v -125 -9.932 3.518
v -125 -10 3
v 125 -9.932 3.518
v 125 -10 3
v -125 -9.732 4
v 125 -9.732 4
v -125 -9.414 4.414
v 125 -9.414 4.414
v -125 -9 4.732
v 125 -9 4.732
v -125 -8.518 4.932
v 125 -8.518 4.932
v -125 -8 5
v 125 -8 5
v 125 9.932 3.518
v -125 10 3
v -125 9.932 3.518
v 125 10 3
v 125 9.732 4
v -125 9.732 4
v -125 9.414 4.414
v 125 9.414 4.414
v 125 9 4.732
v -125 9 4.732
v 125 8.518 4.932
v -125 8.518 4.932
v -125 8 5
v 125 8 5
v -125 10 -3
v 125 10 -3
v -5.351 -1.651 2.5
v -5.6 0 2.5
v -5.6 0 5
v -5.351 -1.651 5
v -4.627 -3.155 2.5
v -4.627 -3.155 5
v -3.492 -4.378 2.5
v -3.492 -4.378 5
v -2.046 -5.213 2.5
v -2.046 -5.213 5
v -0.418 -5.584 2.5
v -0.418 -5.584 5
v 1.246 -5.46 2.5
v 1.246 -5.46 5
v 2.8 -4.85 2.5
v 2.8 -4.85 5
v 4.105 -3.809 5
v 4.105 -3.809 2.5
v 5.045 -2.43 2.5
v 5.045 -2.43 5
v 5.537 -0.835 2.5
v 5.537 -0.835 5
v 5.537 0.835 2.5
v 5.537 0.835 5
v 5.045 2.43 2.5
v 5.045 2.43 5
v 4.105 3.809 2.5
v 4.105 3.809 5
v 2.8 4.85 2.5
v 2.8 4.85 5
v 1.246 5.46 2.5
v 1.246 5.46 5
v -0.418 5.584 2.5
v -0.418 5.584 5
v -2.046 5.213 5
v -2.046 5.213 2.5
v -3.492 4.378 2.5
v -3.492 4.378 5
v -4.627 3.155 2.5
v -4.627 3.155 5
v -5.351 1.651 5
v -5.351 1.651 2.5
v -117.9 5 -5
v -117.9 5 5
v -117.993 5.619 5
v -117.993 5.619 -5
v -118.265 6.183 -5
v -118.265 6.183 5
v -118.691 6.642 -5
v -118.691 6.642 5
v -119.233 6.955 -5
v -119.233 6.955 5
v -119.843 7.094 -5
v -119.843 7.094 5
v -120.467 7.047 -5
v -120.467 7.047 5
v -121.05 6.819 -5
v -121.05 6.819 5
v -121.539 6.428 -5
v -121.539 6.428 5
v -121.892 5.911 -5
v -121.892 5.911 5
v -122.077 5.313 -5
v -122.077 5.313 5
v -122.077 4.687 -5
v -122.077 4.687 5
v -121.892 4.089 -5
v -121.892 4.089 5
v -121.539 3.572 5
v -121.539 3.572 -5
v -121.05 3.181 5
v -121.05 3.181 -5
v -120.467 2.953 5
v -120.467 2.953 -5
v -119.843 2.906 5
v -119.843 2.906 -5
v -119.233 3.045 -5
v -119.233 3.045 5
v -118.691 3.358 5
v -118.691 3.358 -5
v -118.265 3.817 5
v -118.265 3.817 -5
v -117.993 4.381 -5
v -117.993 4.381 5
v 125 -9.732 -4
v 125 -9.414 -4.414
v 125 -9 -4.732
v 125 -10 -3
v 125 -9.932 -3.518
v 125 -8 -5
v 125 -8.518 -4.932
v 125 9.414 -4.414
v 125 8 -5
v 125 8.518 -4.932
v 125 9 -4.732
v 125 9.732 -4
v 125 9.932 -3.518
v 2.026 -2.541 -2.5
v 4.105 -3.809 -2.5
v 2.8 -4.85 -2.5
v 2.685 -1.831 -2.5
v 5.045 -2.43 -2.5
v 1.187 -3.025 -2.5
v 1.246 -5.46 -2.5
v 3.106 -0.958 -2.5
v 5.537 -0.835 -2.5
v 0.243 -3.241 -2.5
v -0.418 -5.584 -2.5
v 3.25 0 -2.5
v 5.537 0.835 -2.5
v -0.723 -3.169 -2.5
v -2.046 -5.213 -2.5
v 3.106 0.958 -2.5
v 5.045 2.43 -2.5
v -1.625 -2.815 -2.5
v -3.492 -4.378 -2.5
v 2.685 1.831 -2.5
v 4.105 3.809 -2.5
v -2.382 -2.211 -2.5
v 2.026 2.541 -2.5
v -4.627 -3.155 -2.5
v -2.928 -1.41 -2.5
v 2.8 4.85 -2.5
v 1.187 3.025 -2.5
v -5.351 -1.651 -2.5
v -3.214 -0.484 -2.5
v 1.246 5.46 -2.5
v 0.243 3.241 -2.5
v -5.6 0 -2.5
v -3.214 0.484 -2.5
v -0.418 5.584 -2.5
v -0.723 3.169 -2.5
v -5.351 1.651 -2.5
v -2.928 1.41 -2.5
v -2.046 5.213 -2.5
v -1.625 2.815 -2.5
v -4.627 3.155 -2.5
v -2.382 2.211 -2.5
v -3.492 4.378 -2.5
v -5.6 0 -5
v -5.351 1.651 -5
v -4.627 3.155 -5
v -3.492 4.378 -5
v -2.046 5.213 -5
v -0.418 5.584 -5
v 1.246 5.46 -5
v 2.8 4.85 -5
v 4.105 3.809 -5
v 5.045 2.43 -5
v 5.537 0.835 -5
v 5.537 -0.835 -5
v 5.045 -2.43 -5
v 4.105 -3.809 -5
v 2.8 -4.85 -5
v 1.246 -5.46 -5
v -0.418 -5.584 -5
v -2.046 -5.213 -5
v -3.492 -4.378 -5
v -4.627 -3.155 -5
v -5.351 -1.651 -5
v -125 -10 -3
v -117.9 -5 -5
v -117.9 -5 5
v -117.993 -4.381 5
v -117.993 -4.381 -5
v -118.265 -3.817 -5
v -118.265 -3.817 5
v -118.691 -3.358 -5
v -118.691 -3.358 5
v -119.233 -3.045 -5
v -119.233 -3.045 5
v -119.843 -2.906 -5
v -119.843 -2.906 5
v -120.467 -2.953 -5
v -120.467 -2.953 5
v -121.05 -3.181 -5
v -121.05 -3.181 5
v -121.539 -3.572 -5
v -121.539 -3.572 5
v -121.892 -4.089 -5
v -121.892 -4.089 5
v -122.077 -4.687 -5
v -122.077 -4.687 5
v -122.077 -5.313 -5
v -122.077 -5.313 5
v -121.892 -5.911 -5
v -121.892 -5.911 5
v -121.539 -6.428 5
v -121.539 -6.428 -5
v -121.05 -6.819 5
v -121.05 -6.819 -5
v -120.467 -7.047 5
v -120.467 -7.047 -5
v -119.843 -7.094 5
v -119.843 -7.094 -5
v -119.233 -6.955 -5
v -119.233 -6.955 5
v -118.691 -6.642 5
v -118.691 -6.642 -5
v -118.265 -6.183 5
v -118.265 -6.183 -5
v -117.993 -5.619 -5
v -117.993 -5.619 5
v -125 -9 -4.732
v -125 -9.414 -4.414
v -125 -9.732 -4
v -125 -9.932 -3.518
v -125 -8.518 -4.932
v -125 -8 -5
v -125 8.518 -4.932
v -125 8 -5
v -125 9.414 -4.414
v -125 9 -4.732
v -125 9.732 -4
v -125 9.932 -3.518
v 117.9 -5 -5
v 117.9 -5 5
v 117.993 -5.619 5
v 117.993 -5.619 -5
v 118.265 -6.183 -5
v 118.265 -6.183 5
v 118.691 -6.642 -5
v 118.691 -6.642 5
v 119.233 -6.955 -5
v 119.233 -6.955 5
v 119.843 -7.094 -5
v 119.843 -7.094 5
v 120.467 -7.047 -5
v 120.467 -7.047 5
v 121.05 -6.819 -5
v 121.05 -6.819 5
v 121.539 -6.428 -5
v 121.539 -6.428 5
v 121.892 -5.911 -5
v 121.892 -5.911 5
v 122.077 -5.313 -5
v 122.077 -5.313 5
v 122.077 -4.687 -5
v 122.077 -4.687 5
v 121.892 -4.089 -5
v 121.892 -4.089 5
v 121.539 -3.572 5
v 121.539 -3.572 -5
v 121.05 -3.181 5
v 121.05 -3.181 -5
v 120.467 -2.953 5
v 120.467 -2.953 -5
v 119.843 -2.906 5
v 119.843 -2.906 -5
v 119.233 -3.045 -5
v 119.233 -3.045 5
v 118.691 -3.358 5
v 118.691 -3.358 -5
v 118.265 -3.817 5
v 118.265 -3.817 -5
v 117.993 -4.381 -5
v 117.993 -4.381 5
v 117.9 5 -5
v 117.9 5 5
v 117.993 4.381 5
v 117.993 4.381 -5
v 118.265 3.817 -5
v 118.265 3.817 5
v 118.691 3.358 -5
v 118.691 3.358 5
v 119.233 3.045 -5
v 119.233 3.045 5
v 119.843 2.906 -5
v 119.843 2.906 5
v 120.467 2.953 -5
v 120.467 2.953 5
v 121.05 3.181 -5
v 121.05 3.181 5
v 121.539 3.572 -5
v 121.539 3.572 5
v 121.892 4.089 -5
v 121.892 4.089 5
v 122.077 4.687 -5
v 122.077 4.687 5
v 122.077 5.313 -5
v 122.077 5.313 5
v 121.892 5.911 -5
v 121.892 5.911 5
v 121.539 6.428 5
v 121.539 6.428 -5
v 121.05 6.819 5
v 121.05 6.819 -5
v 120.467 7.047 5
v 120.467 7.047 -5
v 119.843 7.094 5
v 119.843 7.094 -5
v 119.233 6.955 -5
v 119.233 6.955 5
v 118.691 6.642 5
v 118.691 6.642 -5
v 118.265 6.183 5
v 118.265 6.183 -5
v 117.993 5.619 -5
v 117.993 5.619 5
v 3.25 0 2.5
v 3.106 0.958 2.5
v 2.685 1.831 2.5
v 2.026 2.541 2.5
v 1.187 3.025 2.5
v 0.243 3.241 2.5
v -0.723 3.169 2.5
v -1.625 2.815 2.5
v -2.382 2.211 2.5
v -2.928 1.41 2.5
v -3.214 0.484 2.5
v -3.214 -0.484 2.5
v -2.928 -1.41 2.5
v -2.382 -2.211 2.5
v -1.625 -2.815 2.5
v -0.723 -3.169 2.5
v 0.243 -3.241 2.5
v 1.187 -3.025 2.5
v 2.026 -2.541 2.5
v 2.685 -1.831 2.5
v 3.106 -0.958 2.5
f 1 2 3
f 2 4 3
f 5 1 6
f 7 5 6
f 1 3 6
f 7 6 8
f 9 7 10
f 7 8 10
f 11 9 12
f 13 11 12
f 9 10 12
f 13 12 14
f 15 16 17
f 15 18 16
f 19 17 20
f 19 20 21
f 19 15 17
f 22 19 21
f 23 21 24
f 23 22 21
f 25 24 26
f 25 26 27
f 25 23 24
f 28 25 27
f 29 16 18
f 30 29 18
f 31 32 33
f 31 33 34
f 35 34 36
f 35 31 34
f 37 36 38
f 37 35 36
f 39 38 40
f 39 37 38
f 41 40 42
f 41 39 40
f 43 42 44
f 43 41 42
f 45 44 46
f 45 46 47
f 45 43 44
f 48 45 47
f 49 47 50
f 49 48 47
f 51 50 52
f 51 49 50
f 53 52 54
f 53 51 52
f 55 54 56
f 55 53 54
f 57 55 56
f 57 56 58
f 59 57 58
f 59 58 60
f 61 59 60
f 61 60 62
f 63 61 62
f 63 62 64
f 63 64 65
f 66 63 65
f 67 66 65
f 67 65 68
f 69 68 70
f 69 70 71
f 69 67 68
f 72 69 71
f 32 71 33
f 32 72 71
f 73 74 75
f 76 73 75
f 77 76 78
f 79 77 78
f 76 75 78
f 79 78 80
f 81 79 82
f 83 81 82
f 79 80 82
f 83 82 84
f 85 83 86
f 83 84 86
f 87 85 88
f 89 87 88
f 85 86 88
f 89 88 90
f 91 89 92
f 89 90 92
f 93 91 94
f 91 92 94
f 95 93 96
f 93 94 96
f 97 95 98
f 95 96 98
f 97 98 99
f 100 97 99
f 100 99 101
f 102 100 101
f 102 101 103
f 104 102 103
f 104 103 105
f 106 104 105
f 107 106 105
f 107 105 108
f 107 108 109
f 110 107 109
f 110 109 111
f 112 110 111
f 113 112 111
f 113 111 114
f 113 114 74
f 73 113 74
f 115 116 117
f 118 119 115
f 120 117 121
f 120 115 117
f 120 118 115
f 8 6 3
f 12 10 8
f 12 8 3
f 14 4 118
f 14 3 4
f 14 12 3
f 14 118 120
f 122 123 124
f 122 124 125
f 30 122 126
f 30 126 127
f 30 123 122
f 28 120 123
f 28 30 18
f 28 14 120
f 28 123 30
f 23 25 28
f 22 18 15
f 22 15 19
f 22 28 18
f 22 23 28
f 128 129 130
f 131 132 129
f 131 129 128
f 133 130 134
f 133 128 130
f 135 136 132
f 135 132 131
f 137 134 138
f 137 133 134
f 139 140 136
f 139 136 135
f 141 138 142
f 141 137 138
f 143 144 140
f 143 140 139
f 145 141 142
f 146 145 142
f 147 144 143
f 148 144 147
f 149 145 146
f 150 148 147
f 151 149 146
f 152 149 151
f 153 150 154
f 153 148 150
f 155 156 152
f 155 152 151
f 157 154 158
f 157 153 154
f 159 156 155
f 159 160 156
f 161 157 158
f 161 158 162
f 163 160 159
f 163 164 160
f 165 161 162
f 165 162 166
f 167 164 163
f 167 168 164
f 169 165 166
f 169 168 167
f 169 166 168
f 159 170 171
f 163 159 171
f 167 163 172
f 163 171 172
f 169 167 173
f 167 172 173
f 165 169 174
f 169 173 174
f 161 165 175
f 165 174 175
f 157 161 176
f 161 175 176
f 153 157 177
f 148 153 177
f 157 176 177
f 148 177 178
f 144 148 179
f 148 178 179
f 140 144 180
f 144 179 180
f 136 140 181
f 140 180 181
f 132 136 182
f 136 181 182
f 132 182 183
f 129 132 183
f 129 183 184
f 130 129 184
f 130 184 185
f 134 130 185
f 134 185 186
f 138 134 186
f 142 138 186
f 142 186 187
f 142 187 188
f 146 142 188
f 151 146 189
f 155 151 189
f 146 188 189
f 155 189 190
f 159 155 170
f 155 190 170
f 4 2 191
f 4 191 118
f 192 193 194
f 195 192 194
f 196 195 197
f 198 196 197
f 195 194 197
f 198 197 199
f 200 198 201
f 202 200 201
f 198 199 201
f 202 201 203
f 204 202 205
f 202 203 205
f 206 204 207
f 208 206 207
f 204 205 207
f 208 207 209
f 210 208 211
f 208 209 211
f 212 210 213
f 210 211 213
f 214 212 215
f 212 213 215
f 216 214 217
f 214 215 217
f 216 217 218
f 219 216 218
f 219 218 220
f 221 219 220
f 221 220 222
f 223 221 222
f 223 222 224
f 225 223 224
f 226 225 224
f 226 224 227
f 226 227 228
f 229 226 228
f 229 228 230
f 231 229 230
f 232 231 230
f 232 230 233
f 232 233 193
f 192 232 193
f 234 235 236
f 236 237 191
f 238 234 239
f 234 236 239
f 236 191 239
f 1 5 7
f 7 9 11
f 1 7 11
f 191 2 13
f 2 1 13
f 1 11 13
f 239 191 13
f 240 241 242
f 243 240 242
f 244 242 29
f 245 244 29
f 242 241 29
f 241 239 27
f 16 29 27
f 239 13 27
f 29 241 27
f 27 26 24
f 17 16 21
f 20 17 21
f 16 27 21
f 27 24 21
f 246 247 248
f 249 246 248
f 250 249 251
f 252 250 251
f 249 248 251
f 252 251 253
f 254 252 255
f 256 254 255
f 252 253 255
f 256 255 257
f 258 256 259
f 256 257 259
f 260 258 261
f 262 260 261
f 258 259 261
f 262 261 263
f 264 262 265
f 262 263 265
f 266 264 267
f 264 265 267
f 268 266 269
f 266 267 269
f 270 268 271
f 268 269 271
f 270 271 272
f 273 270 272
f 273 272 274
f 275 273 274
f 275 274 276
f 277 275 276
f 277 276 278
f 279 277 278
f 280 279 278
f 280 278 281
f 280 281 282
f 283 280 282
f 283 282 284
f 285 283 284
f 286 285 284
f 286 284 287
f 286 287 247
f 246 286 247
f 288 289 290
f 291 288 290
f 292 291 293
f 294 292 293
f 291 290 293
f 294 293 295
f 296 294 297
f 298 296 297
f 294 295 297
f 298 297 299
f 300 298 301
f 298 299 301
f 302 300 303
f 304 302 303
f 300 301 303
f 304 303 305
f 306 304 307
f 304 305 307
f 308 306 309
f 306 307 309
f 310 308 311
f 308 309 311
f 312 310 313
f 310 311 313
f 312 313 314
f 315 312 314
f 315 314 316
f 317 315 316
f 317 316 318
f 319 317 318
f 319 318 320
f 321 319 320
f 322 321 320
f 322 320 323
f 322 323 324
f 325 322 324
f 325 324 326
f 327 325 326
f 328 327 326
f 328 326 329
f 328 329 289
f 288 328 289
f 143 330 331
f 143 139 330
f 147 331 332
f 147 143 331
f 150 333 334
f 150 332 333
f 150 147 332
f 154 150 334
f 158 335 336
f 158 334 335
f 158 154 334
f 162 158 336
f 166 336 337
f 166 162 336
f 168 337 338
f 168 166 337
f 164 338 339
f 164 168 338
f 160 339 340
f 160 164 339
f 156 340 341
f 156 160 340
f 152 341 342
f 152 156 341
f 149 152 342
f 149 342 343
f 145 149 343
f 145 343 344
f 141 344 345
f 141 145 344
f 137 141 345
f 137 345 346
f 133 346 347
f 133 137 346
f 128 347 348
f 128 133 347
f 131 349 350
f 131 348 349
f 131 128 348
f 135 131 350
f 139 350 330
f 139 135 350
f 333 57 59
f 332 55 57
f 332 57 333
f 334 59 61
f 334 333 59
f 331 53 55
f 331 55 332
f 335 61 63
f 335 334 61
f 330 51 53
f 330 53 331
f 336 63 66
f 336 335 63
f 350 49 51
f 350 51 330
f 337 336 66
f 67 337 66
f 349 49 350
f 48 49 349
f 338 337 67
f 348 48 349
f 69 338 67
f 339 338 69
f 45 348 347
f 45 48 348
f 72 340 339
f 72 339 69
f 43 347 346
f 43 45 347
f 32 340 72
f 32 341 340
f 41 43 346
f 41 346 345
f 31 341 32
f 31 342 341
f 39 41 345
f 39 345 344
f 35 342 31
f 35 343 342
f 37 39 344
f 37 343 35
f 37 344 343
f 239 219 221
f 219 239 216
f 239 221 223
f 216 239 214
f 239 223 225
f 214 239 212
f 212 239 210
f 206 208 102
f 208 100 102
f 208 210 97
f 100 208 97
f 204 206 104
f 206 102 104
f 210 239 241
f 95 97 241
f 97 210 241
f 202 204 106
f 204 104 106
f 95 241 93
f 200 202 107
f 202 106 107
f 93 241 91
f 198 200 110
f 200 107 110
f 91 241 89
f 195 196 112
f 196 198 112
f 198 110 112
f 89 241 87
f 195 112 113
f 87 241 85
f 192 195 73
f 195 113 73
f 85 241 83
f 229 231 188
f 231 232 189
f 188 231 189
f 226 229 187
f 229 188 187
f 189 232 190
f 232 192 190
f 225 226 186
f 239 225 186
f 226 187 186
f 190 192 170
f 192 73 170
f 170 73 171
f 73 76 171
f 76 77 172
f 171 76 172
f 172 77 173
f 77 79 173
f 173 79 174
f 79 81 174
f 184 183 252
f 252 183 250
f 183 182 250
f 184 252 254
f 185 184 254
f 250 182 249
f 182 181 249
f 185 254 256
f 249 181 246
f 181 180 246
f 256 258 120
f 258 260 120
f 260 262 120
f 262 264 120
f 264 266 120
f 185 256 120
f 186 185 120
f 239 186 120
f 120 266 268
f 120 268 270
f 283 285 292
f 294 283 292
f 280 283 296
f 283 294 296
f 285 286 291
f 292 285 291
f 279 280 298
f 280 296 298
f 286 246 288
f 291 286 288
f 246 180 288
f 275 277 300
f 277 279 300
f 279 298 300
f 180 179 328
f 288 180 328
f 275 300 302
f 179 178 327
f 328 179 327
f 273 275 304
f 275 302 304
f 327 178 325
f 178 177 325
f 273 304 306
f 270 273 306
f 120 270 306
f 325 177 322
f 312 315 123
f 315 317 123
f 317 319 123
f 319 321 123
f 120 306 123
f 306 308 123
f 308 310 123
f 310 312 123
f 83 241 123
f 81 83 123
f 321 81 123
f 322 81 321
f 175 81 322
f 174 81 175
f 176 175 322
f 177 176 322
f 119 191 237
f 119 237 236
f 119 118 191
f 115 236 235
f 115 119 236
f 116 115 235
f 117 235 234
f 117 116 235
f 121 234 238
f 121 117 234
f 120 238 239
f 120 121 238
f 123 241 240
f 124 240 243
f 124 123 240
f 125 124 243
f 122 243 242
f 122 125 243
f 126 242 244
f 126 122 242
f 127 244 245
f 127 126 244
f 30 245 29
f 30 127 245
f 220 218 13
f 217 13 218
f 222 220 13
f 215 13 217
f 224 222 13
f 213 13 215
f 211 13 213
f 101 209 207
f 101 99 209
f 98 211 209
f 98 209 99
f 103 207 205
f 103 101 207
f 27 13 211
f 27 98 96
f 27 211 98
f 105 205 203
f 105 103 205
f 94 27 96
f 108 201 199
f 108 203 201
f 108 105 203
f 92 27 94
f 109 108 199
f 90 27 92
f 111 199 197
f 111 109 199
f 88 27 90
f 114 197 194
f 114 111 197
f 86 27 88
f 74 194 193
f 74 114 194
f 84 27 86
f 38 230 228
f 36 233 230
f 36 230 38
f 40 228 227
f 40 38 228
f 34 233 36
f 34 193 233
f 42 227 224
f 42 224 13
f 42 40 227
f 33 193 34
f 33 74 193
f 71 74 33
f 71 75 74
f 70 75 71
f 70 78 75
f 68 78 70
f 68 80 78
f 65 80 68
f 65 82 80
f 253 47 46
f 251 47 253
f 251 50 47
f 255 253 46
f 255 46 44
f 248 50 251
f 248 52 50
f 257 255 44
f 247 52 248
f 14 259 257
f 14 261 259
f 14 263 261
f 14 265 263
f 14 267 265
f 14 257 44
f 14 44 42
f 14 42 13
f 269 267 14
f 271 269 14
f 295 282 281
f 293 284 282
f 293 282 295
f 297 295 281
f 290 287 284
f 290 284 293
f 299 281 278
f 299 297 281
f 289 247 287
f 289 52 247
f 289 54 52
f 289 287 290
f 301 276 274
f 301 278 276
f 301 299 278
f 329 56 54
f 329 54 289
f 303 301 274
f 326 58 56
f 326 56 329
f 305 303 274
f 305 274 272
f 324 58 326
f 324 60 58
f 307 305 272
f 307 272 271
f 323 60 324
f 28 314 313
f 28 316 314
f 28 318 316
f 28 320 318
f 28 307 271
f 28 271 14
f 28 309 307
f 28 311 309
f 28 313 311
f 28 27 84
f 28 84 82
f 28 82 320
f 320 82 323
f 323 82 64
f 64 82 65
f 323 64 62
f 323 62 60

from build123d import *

# Parameters (mm, degrees)
SKETCH_1_W          = 250
SKETCH_1_H          = 20
SKETCH_1_R          = 3.25
EXTRUDE_1_DEPTH     = 5
SKETCH_2_R          = 5.6
CUT_EXTRUDE_1_DEPTH = 2.5
CUT_EXTRUDE_START   = -2.5
SKETCH_3_R          = 5.6
CUT_EXTRUDE_2_DEPTH = 2.5
SKETCH_4_R          = 2.1
CUT_EXTRUDE_3_DEPTH = 126.797456254
FILLET_1_R          = 2


with BuildPart() as part:
    # 草图1 → 凸台-拉伸1 (new, symmetric)
    with BuildSketch(Plane.XY):
        Rectangle(SKETCH_1_W, SKETCH_1_H)
        Circle(SKETCH_1_R, mode=Mode.SUBTRACT)
    extrude(amount=EXTRUDE_1_DEPTH, both=True)

    # 草图2 → 切除-拉伸1 (cut)
    with BuildSketch(Plane(origin=(0, 0, -5), x_dir=(-1, 0, 0), z_dir=(0, 0, -1))):
        Circle(SKETCH_2_R)
    extrude(amount=-CUT_EXTRUDE_1_DEPTH, mode=Mode.SUBTRACT)

    # 草图3 → 切除-拉伸2 (cut)
    with BuildSketch(Plane.XY.offset(5).offset(CUT_EXTRUDE_START)):
        with Locations(Location((0, 0, 0), (0, 0, 180))):
            Circle(SKETCH_3_R)
    extrude(amount=CUT_EXTRUDE_2_DEPTH, mode=Mode.SUBTRACT)

    # 草图4 → 切除-拉伸3 (cut, through all)
    with BuildSketch(Plane.XY.offset(5)):
        with Locations((-120, 5)):
            Circle(SKETCH_4_R)
        with Locations((-120, -5)):
            Circle(SKETCH_4_R)
        with Locations(Location((120, -5, 0), (0, 0, 180))):
            Circle(SKETCH_4_R)
        with Locations(Location((120, 5, 0), (0, 0, 180))):
            Circle(SKETCH_4_R)
    extrude(amount=-CUT_EXTRUDE_3_DEPTH, mode=Mode.SUBTRACT)

    # 圆角1
    fillet_1_edges = [part.edges().sort_by_distance(p)[0] for p in [
        (0, -10, 5),
        (0, -10, -5),
        (0, 10, -5),
        (0, 10, 5),
    ]]
    fillet(fillet_1_edges, radius=FILLET_1_R)


solid = part.part
